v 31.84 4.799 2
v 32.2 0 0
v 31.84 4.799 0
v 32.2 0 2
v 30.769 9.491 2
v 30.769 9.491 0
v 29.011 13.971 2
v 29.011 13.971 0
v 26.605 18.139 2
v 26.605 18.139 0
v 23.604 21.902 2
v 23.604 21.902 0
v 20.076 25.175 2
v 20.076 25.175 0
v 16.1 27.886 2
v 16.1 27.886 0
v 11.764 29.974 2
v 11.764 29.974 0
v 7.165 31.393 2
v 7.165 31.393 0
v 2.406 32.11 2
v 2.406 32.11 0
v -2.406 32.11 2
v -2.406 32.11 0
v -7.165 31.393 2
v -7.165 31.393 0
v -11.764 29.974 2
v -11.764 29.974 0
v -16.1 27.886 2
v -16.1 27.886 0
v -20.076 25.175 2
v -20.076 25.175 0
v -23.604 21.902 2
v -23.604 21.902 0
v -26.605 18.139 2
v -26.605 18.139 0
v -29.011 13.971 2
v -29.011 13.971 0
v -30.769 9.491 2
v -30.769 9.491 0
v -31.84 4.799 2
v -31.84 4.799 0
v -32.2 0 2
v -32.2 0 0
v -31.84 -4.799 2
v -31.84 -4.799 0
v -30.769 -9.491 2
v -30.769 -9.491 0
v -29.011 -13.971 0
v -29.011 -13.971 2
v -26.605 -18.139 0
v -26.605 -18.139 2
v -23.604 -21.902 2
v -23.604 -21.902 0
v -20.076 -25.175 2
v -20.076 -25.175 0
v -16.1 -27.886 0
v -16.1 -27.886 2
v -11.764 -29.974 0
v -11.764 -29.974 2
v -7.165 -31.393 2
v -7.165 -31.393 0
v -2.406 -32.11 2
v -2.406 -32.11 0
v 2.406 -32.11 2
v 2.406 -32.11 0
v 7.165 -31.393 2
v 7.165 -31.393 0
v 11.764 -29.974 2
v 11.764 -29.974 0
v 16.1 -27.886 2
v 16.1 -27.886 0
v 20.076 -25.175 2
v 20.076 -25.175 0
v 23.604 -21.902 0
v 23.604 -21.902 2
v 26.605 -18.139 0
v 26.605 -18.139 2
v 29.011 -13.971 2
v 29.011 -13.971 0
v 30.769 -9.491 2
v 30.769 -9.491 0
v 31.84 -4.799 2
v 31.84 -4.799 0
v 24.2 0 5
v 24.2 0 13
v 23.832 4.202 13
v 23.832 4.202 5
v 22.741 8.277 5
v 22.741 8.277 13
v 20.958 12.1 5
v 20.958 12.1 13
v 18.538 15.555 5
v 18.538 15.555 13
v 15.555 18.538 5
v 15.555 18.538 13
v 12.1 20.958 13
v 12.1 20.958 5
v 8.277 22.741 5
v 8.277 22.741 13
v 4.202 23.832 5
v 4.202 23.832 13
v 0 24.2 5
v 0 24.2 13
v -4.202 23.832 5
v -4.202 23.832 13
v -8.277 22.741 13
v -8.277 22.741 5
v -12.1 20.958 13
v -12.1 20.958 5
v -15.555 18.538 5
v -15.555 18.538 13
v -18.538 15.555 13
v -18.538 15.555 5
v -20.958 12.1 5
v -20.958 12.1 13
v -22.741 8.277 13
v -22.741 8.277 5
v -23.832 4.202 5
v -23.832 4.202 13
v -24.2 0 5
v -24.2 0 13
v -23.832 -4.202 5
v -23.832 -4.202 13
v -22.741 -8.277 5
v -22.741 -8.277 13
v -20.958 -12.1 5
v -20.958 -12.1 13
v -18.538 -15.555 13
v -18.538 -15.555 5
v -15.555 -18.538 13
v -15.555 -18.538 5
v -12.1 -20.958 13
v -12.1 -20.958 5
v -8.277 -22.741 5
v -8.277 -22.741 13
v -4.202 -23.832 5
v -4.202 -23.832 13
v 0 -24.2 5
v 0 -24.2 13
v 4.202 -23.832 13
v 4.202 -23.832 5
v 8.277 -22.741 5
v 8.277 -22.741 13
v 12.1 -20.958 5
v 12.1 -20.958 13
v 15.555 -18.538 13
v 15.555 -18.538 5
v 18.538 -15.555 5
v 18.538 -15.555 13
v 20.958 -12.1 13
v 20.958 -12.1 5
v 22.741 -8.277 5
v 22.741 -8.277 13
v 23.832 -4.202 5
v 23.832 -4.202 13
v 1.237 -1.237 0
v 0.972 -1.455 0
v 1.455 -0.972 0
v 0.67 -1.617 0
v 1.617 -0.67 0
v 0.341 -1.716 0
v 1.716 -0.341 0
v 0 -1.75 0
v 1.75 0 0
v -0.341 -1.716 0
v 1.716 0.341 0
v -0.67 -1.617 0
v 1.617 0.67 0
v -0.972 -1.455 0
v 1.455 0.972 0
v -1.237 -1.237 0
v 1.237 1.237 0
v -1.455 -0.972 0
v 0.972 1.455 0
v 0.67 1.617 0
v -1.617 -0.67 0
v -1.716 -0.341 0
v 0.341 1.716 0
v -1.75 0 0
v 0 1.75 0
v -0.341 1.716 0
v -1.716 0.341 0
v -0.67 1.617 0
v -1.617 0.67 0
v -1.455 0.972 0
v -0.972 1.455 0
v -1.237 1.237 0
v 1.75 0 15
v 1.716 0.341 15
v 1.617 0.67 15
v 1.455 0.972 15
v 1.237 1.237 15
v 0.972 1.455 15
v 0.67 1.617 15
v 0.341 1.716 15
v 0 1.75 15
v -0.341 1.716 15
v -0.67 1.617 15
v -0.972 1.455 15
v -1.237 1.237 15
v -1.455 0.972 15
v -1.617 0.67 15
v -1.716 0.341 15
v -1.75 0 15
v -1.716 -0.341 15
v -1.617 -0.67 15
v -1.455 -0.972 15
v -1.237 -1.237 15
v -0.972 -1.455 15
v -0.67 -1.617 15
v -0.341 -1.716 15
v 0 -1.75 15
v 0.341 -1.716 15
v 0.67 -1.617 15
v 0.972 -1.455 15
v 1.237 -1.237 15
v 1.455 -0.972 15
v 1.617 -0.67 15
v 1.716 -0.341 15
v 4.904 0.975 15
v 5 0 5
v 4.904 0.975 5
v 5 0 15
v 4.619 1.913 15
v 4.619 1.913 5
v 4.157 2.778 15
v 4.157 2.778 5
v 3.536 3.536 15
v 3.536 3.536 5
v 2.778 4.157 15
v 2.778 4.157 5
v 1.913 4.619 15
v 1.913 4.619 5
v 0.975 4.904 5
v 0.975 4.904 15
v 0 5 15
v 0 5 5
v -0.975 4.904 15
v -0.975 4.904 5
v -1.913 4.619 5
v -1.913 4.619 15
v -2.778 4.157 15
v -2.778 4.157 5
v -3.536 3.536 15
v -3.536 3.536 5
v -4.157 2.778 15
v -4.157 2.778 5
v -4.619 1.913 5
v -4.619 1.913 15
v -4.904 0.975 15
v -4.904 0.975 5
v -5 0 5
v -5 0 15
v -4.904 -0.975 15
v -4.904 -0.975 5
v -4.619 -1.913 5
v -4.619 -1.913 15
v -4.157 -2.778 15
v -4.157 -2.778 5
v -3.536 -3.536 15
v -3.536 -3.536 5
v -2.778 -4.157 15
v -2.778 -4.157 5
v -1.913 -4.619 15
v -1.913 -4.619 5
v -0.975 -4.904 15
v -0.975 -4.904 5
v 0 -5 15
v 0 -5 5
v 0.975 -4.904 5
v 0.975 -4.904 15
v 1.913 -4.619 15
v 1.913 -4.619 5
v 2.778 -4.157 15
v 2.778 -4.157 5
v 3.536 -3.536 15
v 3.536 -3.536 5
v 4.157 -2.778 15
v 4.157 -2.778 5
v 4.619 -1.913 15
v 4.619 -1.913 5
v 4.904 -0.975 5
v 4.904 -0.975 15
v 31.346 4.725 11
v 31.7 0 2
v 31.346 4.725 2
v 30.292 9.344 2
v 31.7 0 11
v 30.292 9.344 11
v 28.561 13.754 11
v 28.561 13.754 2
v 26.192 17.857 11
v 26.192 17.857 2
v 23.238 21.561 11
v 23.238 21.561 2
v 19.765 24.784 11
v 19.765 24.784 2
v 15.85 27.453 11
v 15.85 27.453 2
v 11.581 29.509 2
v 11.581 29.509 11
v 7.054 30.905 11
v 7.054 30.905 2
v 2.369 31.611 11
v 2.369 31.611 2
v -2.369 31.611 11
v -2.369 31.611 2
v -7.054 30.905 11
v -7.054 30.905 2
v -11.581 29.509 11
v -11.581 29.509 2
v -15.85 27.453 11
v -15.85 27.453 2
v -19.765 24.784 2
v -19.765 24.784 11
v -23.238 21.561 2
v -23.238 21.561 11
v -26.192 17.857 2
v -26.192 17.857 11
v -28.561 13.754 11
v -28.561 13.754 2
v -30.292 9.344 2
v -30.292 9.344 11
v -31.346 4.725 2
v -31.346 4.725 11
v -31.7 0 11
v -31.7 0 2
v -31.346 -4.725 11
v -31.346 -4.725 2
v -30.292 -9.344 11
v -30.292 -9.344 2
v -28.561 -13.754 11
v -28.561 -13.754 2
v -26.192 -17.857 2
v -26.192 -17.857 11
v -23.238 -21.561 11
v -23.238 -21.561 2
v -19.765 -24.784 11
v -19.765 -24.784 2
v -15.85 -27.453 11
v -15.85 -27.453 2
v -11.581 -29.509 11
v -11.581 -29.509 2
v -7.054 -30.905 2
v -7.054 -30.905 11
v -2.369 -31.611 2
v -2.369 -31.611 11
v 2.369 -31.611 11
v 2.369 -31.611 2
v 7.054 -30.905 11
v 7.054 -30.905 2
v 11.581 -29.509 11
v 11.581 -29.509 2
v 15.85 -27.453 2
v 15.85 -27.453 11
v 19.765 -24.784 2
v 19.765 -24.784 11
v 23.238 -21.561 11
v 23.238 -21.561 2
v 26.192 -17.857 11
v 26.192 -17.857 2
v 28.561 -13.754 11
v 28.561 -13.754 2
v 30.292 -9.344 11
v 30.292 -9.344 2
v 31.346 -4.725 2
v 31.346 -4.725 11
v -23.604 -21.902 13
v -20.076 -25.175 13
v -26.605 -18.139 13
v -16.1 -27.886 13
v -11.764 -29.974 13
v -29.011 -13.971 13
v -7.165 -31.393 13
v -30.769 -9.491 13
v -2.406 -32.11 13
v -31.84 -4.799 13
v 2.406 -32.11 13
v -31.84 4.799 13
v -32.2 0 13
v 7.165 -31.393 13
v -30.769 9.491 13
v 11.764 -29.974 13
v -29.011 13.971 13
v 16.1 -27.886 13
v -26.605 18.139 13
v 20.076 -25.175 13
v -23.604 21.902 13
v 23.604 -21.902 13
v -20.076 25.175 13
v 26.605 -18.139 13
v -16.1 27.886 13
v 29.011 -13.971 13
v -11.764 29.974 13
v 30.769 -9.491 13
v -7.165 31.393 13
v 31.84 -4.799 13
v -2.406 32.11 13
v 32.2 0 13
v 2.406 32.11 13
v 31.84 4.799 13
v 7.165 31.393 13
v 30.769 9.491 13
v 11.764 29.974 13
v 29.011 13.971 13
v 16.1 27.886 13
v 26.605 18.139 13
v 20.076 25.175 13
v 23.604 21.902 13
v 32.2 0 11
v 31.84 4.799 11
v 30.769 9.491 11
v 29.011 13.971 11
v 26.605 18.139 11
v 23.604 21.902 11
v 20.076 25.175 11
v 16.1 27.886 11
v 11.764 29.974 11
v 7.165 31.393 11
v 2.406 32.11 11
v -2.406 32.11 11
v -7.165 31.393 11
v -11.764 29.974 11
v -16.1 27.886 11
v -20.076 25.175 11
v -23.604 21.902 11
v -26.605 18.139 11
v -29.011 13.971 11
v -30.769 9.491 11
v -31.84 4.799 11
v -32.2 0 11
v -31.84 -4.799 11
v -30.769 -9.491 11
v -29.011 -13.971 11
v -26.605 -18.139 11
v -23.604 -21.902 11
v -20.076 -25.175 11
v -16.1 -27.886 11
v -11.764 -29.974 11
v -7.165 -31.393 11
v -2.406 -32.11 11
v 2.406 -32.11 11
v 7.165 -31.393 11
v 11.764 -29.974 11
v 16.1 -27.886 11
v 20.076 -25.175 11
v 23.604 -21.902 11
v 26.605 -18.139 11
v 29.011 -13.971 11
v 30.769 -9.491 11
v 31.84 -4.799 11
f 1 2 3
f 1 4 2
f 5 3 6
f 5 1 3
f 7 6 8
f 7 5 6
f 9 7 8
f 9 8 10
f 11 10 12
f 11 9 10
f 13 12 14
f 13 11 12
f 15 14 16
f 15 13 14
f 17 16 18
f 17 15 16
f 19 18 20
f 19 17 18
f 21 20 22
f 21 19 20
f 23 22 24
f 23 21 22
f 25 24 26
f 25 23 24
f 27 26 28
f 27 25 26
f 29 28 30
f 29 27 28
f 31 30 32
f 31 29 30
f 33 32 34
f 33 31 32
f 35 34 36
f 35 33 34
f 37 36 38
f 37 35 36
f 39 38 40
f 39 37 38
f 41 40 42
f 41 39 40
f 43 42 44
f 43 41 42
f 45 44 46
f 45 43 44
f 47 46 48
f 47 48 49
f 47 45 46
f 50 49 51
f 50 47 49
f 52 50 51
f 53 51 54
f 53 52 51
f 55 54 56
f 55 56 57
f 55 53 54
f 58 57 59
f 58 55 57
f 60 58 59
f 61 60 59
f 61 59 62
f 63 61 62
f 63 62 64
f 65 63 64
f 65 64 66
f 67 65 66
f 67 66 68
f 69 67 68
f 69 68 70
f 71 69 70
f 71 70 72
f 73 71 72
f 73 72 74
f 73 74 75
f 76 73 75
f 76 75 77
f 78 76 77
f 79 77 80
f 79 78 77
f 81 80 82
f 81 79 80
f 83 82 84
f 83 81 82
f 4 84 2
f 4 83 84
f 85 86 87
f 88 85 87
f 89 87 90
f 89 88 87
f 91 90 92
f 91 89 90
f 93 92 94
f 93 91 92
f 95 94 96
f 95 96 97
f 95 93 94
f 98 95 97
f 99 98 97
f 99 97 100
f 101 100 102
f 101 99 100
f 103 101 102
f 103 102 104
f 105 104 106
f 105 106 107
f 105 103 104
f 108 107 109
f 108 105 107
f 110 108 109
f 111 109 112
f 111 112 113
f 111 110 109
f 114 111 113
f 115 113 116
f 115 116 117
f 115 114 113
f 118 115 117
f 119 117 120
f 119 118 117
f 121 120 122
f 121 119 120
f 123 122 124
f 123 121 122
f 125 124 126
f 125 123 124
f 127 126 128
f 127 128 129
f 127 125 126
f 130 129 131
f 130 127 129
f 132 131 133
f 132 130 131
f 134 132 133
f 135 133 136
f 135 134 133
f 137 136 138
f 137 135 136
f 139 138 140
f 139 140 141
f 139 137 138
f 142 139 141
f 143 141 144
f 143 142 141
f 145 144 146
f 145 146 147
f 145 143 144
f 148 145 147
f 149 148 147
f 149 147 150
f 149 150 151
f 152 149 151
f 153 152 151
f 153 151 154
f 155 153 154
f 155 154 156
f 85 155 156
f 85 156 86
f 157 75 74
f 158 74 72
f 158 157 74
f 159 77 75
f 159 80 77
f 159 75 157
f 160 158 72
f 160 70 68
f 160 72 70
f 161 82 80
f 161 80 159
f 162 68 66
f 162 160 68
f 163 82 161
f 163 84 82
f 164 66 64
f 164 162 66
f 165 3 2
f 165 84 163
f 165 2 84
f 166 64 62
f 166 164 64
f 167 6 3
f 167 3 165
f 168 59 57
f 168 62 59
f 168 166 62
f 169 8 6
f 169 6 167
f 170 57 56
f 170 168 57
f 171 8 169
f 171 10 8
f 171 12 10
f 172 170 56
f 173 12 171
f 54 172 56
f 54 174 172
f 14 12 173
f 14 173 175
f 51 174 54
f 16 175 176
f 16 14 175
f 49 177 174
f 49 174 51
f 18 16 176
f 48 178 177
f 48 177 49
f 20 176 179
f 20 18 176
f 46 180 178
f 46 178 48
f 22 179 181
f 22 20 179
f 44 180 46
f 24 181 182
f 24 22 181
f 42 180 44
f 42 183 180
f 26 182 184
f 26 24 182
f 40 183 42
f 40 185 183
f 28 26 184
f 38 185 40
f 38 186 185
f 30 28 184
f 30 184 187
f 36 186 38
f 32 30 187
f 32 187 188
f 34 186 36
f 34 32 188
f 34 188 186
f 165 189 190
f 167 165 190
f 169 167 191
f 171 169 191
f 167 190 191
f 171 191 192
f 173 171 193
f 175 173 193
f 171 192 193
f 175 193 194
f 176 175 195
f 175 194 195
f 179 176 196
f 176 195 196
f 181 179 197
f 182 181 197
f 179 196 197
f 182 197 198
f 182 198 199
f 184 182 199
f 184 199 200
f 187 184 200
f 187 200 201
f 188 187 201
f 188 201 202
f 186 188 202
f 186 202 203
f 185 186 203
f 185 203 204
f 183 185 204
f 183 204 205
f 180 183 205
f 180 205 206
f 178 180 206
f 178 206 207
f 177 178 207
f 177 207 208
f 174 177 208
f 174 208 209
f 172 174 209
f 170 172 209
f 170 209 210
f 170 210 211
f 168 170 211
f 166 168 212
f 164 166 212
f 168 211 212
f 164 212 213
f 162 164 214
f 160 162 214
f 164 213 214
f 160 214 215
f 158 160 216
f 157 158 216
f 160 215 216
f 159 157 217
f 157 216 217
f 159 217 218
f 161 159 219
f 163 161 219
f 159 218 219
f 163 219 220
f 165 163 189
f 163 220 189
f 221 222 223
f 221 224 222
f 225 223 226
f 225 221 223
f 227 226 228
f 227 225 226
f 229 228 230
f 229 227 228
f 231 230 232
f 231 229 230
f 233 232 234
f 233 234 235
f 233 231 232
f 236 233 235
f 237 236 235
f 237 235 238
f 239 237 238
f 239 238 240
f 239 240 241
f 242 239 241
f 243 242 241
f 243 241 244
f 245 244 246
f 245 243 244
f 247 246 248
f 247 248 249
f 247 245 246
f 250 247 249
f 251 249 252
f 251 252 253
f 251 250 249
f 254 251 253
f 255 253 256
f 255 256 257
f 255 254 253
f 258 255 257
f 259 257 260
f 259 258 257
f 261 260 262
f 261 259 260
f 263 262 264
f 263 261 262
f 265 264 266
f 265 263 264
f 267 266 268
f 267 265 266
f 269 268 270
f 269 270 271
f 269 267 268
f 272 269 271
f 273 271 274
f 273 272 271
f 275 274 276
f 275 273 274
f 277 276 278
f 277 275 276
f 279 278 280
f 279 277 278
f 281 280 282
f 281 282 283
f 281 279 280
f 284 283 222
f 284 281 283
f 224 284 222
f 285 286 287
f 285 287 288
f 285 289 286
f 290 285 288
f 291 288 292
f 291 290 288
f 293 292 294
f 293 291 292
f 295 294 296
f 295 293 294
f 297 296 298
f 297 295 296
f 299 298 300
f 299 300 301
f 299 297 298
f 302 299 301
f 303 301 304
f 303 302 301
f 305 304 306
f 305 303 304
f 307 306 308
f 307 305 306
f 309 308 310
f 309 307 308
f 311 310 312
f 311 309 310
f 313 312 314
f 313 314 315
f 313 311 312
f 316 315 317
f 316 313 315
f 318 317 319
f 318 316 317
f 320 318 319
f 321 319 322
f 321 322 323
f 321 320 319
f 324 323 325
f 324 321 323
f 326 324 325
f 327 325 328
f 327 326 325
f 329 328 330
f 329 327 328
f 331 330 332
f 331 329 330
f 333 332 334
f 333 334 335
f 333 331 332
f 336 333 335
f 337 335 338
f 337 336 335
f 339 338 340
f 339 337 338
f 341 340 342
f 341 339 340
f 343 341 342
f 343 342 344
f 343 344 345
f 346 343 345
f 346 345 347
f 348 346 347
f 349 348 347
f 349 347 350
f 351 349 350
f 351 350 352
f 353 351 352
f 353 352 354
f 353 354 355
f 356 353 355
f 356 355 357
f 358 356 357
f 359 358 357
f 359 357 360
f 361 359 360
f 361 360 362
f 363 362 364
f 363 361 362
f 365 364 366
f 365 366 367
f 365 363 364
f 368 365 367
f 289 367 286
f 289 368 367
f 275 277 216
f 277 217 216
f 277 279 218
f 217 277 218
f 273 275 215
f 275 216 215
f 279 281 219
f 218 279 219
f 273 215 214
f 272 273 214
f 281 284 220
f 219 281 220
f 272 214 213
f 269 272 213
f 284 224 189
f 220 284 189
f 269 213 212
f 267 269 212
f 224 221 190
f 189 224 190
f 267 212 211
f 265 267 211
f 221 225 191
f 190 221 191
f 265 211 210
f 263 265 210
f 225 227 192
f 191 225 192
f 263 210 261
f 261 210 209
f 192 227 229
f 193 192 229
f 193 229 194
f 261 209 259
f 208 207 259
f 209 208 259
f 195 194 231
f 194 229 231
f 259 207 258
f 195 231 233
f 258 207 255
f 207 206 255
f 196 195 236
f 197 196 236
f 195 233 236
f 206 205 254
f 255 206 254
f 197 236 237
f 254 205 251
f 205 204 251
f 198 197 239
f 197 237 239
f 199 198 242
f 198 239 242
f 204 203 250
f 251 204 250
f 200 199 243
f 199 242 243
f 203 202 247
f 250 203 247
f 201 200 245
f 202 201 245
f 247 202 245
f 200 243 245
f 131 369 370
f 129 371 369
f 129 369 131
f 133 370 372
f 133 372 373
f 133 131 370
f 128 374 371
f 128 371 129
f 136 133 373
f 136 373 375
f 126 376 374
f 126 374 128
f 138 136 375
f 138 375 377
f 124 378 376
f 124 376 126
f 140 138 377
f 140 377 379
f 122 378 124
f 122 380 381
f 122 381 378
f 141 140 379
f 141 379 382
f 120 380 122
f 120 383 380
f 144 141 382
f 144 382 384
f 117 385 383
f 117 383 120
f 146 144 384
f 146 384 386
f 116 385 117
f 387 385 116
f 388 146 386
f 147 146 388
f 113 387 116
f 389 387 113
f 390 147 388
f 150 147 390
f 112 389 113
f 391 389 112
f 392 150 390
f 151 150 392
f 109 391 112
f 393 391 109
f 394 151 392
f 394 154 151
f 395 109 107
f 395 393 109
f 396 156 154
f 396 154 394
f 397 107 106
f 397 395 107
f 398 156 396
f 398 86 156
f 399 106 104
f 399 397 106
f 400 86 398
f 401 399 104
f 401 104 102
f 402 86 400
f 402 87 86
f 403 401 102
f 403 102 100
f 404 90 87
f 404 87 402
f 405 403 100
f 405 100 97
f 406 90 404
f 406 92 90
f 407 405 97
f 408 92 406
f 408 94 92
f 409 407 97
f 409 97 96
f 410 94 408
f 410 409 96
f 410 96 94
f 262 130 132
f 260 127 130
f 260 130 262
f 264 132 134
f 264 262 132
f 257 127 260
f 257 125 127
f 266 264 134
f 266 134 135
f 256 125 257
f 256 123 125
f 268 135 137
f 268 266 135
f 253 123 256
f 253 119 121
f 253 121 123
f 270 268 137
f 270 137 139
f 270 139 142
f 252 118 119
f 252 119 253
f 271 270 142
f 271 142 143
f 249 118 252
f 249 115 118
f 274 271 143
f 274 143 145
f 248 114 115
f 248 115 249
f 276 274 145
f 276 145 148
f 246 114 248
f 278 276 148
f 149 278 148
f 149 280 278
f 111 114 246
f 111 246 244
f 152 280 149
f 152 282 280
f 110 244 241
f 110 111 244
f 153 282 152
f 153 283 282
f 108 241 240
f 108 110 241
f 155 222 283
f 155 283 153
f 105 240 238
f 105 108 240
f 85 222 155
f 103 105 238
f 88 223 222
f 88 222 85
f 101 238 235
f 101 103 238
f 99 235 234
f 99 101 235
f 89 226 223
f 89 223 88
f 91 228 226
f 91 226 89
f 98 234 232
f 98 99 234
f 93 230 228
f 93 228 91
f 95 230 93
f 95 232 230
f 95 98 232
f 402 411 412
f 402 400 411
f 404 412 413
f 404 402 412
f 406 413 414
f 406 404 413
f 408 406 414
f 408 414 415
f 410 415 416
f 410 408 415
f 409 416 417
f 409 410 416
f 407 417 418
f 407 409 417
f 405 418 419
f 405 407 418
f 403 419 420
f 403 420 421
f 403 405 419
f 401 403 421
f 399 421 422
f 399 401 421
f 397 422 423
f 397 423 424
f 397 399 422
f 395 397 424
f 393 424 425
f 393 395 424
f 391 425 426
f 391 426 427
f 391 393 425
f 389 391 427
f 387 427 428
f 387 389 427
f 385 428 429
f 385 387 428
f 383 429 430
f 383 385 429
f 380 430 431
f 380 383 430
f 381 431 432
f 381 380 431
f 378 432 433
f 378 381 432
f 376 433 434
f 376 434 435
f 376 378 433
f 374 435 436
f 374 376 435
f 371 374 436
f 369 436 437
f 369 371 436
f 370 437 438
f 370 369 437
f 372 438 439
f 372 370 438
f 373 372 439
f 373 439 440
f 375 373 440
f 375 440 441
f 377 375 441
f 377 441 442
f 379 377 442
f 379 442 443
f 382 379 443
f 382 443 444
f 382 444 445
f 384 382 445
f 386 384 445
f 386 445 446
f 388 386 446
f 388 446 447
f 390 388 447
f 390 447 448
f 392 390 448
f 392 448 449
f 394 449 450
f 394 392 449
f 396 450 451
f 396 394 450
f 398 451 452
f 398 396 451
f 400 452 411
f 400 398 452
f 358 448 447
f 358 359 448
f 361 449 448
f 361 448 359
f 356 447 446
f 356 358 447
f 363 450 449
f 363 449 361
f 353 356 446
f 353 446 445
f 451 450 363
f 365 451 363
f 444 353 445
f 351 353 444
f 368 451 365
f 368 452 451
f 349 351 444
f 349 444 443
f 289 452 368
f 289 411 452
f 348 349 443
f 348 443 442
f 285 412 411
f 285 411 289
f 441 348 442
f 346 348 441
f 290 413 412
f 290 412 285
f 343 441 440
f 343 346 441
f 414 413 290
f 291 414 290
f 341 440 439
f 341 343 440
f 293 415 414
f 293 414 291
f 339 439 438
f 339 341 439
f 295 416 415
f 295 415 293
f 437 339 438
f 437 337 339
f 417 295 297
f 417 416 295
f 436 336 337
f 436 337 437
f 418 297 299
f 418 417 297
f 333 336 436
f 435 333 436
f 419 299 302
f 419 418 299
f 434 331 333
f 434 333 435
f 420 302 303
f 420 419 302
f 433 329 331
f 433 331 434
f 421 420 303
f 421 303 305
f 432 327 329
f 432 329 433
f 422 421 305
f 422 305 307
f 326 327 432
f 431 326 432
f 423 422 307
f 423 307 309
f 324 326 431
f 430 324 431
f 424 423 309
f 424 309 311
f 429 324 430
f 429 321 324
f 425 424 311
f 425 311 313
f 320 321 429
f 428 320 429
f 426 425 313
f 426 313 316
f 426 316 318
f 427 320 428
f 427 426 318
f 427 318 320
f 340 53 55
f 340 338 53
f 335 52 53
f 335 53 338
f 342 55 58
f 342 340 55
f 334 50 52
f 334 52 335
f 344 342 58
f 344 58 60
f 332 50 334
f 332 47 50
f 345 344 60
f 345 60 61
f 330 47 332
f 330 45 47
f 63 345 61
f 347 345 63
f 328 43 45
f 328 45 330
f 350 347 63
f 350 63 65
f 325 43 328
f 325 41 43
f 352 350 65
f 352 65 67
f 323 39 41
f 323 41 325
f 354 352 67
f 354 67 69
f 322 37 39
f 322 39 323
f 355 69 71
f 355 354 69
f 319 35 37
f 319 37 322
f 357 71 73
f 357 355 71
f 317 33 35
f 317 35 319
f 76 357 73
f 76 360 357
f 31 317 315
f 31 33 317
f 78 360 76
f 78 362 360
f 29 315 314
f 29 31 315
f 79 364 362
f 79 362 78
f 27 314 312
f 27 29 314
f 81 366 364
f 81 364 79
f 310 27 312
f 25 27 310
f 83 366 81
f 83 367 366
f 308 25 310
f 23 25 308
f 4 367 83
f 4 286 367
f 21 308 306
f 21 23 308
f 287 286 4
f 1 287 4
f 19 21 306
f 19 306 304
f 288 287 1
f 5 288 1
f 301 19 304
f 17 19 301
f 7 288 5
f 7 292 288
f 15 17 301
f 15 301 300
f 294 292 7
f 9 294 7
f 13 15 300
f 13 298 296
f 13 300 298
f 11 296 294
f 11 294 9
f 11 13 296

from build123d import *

# Parameters (mm, degrees)
F0_W     = 5
F0_H     = 10
F3_R     = 1.75
F4_DEPTH = 40


with BuildPart() as f1:
    # F0 (on Front) → F1 (revolve)
    with BuildSketch(Plane.XZ):
        with Locations((2.5, 10)):
            Rectangle(F0_W, F0_H)
        Polygon((0, 5), (0, 0), (32.2, 0), (32.2, 2), (31.7, 2), (31.7, 11), (32.2, 11), (32.2, 13), (24.2, 13), (24.2, 5), (5, 5), align=None)
    revolve(axis=Axis((0, 0, 10), (0, 0, 1)))

    # F3 (on face) → F4 (cut)
    with BuildSketch(Plane.XY.offset(15)):
        Circle(F3_R)
    extrude(amount=-F4_DEPTH, mode=Mode.SUBTRACT)


solid = f1.part
